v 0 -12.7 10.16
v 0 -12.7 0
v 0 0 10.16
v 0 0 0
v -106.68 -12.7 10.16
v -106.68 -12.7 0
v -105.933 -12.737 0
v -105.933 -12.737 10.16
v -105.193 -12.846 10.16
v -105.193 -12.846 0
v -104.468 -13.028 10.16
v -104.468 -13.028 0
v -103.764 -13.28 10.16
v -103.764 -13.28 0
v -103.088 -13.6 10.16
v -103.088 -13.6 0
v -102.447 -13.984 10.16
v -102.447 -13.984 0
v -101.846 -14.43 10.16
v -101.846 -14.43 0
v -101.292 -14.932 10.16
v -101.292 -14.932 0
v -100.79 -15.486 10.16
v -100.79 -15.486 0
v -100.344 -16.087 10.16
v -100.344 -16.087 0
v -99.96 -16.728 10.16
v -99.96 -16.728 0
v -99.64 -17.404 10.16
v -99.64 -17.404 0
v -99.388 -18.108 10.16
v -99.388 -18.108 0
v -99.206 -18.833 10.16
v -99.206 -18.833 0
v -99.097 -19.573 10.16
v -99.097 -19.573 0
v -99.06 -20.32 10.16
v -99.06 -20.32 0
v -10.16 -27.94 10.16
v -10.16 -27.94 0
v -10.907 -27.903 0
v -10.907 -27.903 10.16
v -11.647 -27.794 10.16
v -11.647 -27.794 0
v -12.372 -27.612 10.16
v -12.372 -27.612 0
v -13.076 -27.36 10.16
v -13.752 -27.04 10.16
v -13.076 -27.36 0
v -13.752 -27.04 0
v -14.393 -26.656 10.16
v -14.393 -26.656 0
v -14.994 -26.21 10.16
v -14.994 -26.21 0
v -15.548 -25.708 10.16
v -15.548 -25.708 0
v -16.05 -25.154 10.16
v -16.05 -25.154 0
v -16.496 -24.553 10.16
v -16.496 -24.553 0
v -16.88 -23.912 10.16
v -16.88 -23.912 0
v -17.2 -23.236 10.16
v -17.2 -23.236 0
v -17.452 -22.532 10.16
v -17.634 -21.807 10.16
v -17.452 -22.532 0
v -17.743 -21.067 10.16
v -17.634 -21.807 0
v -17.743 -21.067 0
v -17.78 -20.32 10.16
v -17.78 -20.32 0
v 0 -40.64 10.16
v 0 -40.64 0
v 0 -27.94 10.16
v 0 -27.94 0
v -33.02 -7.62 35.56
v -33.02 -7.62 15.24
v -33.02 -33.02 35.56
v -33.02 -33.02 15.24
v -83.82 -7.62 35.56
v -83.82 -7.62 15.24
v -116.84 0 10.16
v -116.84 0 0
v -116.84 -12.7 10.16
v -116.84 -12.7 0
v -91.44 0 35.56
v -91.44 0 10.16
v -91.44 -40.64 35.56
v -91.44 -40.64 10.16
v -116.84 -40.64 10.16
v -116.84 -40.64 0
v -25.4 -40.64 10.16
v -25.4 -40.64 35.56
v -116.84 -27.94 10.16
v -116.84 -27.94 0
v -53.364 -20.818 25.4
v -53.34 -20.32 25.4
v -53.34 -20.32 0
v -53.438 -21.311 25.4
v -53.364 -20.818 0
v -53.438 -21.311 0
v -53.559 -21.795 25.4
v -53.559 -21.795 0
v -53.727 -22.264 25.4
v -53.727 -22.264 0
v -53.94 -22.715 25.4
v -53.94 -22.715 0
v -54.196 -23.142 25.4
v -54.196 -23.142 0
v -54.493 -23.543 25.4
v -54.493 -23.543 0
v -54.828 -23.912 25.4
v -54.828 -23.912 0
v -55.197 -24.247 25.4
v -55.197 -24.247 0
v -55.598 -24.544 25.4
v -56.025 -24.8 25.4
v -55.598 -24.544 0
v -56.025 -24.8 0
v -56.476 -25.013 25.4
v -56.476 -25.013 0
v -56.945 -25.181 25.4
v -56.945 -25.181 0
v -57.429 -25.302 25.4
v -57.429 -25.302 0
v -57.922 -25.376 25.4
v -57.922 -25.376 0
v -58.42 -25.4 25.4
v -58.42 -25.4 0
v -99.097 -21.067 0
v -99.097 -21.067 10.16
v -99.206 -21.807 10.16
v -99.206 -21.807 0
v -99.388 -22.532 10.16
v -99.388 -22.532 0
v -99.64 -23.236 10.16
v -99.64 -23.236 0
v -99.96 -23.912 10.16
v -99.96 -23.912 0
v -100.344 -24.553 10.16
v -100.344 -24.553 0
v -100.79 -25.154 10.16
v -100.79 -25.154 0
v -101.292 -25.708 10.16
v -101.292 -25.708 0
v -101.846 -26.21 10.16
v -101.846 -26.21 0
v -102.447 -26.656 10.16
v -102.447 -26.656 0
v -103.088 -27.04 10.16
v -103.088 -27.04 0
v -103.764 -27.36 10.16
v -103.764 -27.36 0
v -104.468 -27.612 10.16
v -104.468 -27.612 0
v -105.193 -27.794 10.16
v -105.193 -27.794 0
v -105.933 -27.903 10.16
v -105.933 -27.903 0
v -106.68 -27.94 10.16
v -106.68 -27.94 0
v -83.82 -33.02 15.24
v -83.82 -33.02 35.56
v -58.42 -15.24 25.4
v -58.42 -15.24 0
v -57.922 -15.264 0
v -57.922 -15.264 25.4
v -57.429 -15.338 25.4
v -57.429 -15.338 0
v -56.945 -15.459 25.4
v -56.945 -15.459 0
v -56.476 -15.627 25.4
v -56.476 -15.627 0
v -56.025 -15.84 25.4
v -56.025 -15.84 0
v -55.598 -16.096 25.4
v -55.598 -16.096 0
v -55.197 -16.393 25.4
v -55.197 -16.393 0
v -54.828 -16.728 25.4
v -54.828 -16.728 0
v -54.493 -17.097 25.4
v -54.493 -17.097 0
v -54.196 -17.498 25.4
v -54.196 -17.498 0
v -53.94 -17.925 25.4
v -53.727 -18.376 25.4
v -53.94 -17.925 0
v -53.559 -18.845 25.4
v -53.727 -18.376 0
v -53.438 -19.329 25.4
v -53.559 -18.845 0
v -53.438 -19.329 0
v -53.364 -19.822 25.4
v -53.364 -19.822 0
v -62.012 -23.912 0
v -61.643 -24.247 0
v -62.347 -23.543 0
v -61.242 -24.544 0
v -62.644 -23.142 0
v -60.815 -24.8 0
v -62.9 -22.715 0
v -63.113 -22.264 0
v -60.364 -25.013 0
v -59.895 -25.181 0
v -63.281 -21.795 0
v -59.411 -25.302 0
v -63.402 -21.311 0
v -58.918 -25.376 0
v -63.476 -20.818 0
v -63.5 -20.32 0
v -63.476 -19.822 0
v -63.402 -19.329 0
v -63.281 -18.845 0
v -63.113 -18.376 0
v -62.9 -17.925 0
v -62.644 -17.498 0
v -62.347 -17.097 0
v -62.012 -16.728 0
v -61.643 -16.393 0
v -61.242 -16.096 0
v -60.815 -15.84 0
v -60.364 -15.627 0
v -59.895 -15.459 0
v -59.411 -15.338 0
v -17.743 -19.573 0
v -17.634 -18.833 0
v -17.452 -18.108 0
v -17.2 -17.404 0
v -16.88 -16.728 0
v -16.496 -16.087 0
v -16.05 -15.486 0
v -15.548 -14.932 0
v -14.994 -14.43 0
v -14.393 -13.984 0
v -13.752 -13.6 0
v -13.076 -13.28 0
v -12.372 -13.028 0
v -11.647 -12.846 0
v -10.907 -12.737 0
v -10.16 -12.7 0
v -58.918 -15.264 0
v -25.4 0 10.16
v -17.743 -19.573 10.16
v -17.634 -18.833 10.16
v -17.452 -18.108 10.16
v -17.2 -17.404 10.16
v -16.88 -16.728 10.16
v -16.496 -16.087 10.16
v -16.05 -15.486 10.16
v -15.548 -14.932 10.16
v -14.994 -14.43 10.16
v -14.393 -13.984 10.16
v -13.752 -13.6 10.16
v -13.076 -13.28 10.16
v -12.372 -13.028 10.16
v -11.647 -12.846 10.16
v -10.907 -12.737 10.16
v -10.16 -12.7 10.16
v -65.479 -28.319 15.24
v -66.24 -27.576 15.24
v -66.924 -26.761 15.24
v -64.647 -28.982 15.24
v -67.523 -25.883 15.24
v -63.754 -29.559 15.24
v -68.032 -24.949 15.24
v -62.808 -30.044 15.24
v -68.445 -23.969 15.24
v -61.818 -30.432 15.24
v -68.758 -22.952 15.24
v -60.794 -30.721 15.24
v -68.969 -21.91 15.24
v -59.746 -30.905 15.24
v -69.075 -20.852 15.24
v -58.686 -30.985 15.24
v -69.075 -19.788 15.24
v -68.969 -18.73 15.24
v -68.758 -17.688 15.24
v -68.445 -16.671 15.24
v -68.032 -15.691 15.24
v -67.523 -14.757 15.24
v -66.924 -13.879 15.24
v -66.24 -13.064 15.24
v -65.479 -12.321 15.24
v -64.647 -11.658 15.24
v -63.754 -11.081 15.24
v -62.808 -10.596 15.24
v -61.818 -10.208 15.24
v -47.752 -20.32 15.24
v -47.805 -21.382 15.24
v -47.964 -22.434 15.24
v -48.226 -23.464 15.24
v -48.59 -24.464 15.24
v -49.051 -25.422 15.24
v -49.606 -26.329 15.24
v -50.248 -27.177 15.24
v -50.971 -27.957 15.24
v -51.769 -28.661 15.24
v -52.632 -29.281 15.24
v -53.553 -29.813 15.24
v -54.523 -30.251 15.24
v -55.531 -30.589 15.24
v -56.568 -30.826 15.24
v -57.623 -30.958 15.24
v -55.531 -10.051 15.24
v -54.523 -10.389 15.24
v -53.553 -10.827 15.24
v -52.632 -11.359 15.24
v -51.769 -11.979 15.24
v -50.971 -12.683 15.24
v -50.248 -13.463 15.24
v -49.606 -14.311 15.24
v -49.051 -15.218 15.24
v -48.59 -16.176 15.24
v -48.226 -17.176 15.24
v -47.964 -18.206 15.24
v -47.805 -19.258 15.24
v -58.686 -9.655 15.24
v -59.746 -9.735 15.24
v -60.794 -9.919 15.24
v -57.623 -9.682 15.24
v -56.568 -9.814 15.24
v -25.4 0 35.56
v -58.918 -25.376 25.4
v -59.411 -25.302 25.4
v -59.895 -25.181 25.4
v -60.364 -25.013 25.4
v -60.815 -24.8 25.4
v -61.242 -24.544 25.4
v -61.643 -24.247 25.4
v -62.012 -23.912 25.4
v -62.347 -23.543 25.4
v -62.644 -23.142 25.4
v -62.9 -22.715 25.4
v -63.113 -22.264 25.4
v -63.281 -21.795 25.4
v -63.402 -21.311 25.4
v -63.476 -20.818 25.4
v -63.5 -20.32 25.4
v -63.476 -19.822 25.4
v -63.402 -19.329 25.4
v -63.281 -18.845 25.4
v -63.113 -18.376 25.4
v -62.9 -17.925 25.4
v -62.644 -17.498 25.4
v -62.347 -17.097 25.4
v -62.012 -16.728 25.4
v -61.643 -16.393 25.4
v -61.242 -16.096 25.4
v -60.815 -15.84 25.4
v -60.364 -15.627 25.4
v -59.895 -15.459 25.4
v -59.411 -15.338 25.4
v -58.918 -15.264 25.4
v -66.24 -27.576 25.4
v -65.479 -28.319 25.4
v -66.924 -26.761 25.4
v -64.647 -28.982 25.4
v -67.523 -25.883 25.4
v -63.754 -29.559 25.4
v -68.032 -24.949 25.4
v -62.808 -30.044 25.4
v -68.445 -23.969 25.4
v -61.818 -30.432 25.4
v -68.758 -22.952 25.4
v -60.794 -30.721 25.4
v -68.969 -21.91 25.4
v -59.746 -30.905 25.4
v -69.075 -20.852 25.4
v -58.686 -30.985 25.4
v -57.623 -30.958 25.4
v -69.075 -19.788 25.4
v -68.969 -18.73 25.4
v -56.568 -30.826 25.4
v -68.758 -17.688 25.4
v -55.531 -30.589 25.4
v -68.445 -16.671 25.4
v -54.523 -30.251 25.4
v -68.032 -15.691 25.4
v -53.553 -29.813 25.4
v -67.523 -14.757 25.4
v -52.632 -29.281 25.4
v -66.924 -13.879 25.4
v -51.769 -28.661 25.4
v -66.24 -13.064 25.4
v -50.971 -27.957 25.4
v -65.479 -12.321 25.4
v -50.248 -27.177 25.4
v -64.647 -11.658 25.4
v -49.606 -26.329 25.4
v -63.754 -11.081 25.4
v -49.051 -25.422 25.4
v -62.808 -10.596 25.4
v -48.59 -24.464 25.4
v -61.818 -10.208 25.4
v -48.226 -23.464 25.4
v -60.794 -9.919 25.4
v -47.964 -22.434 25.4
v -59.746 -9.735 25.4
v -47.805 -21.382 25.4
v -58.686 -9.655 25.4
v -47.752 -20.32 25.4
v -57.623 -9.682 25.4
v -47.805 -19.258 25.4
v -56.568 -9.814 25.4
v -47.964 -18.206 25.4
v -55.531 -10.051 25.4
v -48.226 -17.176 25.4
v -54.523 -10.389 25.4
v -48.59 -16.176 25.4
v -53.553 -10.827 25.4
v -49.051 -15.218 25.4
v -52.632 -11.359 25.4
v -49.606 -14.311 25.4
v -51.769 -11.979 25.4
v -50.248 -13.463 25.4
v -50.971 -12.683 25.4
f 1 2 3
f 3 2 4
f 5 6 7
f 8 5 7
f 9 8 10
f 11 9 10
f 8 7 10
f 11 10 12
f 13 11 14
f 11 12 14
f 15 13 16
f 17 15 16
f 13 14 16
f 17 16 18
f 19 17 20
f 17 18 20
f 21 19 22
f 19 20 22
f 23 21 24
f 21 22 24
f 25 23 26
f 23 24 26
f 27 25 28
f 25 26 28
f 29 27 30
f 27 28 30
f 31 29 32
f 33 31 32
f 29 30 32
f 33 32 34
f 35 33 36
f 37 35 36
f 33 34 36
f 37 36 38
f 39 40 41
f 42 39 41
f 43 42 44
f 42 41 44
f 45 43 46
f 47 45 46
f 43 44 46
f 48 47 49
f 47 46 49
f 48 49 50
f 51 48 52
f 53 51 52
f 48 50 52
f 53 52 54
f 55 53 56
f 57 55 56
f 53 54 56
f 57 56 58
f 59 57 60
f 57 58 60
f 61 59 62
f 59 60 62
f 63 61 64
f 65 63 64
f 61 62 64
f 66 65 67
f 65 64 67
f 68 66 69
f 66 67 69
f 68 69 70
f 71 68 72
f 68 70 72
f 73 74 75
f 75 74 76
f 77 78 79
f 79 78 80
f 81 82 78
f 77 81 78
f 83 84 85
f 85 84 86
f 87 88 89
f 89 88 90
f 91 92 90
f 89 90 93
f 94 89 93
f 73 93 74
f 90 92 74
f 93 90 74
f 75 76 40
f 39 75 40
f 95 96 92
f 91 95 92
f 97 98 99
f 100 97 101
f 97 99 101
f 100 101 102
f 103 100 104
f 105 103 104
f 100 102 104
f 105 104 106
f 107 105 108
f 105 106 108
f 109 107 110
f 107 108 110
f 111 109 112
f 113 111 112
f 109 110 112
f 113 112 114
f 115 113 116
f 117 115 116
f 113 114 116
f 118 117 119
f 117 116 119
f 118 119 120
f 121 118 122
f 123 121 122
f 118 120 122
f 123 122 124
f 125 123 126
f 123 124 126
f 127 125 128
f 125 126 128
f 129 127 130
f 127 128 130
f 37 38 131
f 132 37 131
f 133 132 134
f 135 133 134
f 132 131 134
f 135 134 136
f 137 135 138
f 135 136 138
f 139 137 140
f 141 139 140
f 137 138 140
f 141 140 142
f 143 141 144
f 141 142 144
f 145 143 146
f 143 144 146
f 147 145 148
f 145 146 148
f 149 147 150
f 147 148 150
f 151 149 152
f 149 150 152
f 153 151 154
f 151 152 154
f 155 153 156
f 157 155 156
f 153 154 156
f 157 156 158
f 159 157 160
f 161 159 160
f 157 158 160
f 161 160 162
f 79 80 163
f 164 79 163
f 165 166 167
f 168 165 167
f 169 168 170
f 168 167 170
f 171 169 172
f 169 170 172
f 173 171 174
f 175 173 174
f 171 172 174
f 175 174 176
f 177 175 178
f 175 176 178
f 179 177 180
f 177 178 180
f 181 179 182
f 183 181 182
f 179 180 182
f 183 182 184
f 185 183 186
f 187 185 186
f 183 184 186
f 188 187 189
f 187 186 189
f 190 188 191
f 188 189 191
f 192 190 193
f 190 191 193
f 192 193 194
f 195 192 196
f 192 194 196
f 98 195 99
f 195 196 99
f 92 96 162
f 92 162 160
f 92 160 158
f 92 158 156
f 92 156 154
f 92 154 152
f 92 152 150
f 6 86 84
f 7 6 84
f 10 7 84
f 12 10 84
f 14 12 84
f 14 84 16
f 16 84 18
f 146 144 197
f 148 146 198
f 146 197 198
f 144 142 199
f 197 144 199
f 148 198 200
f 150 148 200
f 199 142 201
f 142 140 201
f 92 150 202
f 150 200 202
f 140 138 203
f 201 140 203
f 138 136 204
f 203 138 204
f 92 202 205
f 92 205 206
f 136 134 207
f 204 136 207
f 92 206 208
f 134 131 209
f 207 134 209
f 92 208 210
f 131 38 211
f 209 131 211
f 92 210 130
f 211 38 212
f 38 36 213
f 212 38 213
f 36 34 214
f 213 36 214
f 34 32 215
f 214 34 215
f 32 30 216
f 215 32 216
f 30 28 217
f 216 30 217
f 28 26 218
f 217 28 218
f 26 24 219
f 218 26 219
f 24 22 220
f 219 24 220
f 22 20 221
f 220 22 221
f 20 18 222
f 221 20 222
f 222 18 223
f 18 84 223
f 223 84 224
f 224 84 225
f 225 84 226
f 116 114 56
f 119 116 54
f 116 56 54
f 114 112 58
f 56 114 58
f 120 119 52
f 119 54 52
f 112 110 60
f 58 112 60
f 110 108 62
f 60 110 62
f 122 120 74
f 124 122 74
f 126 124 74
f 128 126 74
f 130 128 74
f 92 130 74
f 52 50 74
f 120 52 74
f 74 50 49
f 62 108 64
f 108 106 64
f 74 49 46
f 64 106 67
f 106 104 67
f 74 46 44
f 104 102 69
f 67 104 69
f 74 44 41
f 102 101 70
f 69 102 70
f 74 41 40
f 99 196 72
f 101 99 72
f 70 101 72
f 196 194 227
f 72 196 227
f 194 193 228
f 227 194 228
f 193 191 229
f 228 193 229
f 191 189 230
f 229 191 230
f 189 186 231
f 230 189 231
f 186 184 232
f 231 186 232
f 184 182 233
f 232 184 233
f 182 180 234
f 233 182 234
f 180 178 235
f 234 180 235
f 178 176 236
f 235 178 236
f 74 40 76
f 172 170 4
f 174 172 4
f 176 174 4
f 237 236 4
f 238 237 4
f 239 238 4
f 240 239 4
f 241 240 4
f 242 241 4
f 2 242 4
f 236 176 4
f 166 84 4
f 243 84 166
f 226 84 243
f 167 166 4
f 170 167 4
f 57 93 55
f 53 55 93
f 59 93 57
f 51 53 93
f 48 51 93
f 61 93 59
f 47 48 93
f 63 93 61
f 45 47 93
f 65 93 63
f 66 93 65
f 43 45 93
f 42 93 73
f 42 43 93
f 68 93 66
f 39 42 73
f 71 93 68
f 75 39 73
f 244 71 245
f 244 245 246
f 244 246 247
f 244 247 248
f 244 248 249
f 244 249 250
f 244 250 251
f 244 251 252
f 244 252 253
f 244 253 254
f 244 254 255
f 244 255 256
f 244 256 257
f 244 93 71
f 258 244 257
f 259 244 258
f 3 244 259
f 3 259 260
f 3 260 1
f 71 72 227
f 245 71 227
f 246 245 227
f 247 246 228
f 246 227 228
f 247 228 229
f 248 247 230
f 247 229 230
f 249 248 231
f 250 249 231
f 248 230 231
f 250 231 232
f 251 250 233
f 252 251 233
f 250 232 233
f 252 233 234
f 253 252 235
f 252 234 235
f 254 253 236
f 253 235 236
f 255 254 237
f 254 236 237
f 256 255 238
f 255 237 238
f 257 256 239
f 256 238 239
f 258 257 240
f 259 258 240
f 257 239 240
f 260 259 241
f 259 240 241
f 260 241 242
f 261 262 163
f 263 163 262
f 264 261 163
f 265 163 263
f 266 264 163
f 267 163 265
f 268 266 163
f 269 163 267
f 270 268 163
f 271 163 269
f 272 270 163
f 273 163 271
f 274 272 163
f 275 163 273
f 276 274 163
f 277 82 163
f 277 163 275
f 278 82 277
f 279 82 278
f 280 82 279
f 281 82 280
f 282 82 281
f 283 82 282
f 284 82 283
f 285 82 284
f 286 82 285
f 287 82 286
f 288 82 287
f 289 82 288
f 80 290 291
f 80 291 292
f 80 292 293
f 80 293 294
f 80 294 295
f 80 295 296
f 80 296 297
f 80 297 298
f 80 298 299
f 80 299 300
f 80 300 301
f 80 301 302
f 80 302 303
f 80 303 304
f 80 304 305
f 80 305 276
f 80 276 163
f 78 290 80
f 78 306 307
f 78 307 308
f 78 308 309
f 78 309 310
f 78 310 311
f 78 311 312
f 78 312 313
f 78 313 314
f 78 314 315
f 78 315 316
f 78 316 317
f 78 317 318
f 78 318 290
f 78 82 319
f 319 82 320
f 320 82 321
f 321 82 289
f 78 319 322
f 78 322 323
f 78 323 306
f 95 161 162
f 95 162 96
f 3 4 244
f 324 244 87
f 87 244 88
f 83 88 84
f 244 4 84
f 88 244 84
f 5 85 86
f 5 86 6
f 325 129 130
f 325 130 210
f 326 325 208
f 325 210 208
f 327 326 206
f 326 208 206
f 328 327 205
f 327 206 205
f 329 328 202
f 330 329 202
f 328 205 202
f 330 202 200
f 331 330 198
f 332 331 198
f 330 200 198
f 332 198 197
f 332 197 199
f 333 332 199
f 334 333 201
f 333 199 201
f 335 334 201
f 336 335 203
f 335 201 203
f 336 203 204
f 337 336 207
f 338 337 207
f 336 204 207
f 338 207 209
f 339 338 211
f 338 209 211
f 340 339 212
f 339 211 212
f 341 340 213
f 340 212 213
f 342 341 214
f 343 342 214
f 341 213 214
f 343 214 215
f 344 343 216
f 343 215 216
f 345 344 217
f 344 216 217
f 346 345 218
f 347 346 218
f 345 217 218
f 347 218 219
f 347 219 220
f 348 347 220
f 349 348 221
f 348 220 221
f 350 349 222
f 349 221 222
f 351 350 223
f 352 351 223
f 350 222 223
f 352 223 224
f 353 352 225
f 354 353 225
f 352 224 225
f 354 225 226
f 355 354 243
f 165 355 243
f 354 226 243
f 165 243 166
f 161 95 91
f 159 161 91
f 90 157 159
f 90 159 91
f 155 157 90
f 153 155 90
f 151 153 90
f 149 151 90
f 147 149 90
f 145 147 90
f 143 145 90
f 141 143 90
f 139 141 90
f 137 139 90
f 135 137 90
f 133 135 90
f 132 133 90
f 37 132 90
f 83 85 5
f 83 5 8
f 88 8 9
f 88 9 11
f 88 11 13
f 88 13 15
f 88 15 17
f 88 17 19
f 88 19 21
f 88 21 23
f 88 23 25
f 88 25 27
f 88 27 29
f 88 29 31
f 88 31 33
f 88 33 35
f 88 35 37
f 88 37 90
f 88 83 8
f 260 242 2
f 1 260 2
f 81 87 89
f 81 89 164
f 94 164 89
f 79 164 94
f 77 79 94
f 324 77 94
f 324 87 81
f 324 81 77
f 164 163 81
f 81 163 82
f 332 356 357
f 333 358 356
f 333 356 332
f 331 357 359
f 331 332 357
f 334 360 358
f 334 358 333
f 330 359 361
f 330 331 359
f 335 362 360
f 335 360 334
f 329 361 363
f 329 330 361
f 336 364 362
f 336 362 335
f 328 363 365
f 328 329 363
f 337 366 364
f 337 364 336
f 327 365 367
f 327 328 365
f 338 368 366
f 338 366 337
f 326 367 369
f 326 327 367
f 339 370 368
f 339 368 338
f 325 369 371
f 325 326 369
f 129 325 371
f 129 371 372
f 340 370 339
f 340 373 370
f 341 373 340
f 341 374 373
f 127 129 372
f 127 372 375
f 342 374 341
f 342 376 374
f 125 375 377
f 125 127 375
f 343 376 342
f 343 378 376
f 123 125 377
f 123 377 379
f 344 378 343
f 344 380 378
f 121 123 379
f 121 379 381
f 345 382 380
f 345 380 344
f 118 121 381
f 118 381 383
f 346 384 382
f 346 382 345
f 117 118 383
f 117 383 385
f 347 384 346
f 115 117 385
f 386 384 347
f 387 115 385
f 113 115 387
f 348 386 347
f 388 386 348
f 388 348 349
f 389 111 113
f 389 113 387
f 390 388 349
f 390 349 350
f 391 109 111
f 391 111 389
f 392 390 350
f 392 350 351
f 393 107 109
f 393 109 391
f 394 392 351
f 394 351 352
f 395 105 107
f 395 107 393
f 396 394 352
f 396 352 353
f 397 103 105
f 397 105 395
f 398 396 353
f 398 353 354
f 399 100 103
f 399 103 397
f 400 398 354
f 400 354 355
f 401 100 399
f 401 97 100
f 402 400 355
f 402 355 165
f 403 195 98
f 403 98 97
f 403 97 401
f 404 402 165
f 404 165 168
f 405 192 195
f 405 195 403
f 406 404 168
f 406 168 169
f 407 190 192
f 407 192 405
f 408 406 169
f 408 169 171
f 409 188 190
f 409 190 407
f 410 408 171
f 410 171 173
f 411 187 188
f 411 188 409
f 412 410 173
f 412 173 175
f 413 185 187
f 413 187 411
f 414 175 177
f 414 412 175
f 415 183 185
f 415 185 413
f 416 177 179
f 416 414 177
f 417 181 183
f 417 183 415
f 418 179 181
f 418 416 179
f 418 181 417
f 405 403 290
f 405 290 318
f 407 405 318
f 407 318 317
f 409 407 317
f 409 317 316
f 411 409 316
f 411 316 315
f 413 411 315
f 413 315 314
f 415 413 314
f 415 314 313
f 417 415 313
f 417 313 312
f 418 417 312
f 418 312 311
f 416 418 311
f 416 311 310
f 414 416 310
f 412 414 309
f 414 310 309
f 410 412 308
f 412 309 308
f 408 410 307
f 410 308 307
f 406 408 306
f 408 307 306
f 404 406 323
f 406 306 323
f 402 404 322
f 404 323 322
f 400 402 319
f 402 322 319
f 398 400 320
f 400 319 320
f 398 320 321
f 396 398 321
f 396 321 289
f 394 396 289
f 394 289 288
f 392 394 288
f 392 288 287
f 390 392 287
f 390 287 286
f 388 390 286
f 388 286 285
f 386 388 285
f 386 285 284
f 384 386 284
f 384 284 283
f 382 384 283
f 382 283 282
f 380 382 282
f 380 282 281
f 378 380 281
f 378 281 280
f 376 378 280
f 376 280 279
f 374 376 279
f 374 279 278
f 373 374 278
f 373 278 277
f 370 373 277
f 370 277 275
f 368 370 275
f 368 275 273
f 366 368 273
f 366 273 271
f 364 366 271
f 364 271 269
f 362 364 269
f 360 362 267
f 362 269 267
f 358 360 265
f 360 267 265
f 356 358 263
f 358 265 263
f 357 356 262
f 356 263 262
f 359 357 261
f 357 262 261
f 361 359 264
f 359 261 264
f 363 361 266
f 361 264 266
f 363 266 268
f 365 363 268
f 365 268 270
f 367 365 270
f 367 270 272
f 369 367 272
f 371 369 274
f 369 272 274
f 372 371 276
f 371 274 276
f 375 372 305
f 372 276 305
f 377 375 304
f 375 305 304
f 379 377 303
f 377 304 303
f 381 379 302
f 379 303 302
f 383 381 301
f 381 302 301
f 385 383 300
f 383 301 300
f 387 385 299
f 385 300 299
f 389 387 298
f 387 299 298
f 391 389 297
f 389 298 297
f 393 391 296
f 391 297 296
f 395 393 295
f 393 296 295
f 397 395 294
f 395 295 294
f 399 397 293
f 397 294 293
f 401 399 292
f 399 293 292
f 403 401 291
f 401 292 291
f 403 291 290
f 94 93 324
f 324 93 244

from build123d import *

# Parameters (mm, degrees)
F1_DEPTH = 10.16
F2_DEPTH = 35.56
F3_DEPTH = 15.24
F4_DEPTH = 25.4


with BuildPart() as f1:
    # F0 (on Top) → F1 (new body)
    with BuildSketch(Plane.XY):
        with BuildLine():
            Line((-91.44, -20.32), (-91.44, 0))
            Line((-91.44, 0), (-116.84, 0))
            Line((-116.84, 0), (-116.84, -12.7))
            Line((-116.84, -12.7), (-106.68, -12.7))
            ThreePointArc((-106.68, -12.7), (-101.2918463274, -14.9318463274), (-99.06, -20.32))
            ThreePointArc((-99.06, -20.32), (-101.2918463274, -25.7081536726), (-106.68, -27.94))
            Line((-106.68, -27.94), (-116.84, -27.94))
            Line((-116.84, -27.94), (-116.84, -40.64))
            Line((-116.84, -40.64), (-91.44, -40.64))
            Line((-91.44, -40.64), (-91.44, -20.32))
        make_face()
    extrude(amount=F1_DEPTH)



with BuildPart() as f1b:
    # F0 (on Top) → F1, piece 2 (new body)
    with BuildSketch(Plane.XY):
        with BuildLine():
            Line((0, -12.7), (0, 0))
            Line((0, 0), (-25.4, 0))
            Line((-25.4, 0), (-25.4, -20.32))
            Line((-25.4, -20.32), (-25.4, -40.64))
            Line((-25.4, -40.64), (0, -40.64))
            Line((0, -40.64), (0, -27.94))
            Line((0, -27.94), (-10.16, -27.94))
            ThreePointArc((-10.16, -27.94), (-15.5481536726, -25.7081536726), (-17.78, -20.32))
            ThreePointArc((-17.78, -20.32), (-15.5481536726, -14.9318463274), (-10.16, -12.7))
            Line((-10.16, -12.7), (0, -12.7))
        make_face()
    extrude(amount=F1_DEPTH)


with BuildPart() as f1_1:
    add(f1.part)

    add(f1b.part)  # F2 merges F1b
    # F0 (on Top) → F2 (join)
    with BuildSketch(Plane.XY):
        Polygon((-25.4, -20.32), (-25.4, 0), (-58.42, 0), (-91.44, 0), (-91.44, -20.32), (-91.44, -40.64), (-58.42, -40.64), (-25.4, -40.64), align=None)
        Polygon((-33.02, -7.62), (-33.02, -20.32), (-33.02, -33.02), (-58.42, -33.02), (-83.82, -33.02), (-83.82, -20.32), (-83.82, -7.62), (-58.42, -7.62), align=None, mode=Mode.SUBTRACT)
    extrude(amount=F2_DEPTH)

    # F0 (on Top) → F3 (join)
    with BuildSketch(Plane.XY):
        with BuildLine():
            Line((-58.42, -9.652), (-58.42, -7.62))
            Line((-58.42, -7.62), (-83.82, -7.62))
            Line((-83.82, -7.62), (-83.82, -20.32))
            Line((-83.82, -20.32), (-83.82, -33.02))
            Line((-83.82, -33.02), (-58.42, -33.02))
            Line((-58.42, -33.02), (-58.42, -30.988))
            ThreePointArc((-58.42, -30.988), (-69.088, -20.32), (-58.42, -9.652))
        make_face()
        with BuildLine():
            Line((-33.02, -33.02), (-33.02, -20.32))
            Line((-33.02, -20.32), (-33.02, -7.62))
            Line((-33.02, -7.62), (-58.42, -7.62))
            Line((-58.42, -7.62), (-58.42, -9.652))
            ThreePointArc((-58.42, -9.652), (-50.8765848583, -12.7765848583), (-47.752, -20.32))
            ThreePointArc((-47.752, -20.32), (-50.8765848583, -27.8634151417), (-58.42, -30.988))
            Line((-58.42, -30.988), (-58.42, -33.02))
            Line((-58.42, -33.02), (-33.02, -33.02))
        make_face()
    extrude(amount=F3_DEPTH)

    # F0 (on Top) → F4 (join)
    with BuildSketch(Plane.XY):
        with BuildLine():
            Line((-58.42, -15.24), (-58.42, -9.652))
            ThreePointArc((-58.42, -9.652), (-69.088, -20.32), (-58.42, -30.988))
            Line((-58.42, -30.988), (-58.42, -25.4))
            ThreePointArc((-58.42, -25.4), (-63.5, -20.32), (-58.42, -15.24))
        make_face()
        with BuildLine():
            ThreePointArc((-47.752, -20.32), (-50.8765848583, -12.7765848583), (-58.42, -9.652))
            Line((-58.42, -9.652), (-58.42, -15.24))
            ThreePointArc((-58.42, -15.24), (-54.8278975516, -16.7278975516), (-53.34, -20.32))
            ThreePointArc((-53.34, -20.32), (-54.8278975516, -23.9121024484), (-58.42, -25.4))
            Line((-58.42, -25.4), (-58.42, -30.988))
            ThreePointArc((-58.42, -30.988), (-50.8765848583, -27.8634151417), (-47.752, -20.32))
        make_face()
    extrude(amount=F4_DEPTH)


solid = f1_1.part
